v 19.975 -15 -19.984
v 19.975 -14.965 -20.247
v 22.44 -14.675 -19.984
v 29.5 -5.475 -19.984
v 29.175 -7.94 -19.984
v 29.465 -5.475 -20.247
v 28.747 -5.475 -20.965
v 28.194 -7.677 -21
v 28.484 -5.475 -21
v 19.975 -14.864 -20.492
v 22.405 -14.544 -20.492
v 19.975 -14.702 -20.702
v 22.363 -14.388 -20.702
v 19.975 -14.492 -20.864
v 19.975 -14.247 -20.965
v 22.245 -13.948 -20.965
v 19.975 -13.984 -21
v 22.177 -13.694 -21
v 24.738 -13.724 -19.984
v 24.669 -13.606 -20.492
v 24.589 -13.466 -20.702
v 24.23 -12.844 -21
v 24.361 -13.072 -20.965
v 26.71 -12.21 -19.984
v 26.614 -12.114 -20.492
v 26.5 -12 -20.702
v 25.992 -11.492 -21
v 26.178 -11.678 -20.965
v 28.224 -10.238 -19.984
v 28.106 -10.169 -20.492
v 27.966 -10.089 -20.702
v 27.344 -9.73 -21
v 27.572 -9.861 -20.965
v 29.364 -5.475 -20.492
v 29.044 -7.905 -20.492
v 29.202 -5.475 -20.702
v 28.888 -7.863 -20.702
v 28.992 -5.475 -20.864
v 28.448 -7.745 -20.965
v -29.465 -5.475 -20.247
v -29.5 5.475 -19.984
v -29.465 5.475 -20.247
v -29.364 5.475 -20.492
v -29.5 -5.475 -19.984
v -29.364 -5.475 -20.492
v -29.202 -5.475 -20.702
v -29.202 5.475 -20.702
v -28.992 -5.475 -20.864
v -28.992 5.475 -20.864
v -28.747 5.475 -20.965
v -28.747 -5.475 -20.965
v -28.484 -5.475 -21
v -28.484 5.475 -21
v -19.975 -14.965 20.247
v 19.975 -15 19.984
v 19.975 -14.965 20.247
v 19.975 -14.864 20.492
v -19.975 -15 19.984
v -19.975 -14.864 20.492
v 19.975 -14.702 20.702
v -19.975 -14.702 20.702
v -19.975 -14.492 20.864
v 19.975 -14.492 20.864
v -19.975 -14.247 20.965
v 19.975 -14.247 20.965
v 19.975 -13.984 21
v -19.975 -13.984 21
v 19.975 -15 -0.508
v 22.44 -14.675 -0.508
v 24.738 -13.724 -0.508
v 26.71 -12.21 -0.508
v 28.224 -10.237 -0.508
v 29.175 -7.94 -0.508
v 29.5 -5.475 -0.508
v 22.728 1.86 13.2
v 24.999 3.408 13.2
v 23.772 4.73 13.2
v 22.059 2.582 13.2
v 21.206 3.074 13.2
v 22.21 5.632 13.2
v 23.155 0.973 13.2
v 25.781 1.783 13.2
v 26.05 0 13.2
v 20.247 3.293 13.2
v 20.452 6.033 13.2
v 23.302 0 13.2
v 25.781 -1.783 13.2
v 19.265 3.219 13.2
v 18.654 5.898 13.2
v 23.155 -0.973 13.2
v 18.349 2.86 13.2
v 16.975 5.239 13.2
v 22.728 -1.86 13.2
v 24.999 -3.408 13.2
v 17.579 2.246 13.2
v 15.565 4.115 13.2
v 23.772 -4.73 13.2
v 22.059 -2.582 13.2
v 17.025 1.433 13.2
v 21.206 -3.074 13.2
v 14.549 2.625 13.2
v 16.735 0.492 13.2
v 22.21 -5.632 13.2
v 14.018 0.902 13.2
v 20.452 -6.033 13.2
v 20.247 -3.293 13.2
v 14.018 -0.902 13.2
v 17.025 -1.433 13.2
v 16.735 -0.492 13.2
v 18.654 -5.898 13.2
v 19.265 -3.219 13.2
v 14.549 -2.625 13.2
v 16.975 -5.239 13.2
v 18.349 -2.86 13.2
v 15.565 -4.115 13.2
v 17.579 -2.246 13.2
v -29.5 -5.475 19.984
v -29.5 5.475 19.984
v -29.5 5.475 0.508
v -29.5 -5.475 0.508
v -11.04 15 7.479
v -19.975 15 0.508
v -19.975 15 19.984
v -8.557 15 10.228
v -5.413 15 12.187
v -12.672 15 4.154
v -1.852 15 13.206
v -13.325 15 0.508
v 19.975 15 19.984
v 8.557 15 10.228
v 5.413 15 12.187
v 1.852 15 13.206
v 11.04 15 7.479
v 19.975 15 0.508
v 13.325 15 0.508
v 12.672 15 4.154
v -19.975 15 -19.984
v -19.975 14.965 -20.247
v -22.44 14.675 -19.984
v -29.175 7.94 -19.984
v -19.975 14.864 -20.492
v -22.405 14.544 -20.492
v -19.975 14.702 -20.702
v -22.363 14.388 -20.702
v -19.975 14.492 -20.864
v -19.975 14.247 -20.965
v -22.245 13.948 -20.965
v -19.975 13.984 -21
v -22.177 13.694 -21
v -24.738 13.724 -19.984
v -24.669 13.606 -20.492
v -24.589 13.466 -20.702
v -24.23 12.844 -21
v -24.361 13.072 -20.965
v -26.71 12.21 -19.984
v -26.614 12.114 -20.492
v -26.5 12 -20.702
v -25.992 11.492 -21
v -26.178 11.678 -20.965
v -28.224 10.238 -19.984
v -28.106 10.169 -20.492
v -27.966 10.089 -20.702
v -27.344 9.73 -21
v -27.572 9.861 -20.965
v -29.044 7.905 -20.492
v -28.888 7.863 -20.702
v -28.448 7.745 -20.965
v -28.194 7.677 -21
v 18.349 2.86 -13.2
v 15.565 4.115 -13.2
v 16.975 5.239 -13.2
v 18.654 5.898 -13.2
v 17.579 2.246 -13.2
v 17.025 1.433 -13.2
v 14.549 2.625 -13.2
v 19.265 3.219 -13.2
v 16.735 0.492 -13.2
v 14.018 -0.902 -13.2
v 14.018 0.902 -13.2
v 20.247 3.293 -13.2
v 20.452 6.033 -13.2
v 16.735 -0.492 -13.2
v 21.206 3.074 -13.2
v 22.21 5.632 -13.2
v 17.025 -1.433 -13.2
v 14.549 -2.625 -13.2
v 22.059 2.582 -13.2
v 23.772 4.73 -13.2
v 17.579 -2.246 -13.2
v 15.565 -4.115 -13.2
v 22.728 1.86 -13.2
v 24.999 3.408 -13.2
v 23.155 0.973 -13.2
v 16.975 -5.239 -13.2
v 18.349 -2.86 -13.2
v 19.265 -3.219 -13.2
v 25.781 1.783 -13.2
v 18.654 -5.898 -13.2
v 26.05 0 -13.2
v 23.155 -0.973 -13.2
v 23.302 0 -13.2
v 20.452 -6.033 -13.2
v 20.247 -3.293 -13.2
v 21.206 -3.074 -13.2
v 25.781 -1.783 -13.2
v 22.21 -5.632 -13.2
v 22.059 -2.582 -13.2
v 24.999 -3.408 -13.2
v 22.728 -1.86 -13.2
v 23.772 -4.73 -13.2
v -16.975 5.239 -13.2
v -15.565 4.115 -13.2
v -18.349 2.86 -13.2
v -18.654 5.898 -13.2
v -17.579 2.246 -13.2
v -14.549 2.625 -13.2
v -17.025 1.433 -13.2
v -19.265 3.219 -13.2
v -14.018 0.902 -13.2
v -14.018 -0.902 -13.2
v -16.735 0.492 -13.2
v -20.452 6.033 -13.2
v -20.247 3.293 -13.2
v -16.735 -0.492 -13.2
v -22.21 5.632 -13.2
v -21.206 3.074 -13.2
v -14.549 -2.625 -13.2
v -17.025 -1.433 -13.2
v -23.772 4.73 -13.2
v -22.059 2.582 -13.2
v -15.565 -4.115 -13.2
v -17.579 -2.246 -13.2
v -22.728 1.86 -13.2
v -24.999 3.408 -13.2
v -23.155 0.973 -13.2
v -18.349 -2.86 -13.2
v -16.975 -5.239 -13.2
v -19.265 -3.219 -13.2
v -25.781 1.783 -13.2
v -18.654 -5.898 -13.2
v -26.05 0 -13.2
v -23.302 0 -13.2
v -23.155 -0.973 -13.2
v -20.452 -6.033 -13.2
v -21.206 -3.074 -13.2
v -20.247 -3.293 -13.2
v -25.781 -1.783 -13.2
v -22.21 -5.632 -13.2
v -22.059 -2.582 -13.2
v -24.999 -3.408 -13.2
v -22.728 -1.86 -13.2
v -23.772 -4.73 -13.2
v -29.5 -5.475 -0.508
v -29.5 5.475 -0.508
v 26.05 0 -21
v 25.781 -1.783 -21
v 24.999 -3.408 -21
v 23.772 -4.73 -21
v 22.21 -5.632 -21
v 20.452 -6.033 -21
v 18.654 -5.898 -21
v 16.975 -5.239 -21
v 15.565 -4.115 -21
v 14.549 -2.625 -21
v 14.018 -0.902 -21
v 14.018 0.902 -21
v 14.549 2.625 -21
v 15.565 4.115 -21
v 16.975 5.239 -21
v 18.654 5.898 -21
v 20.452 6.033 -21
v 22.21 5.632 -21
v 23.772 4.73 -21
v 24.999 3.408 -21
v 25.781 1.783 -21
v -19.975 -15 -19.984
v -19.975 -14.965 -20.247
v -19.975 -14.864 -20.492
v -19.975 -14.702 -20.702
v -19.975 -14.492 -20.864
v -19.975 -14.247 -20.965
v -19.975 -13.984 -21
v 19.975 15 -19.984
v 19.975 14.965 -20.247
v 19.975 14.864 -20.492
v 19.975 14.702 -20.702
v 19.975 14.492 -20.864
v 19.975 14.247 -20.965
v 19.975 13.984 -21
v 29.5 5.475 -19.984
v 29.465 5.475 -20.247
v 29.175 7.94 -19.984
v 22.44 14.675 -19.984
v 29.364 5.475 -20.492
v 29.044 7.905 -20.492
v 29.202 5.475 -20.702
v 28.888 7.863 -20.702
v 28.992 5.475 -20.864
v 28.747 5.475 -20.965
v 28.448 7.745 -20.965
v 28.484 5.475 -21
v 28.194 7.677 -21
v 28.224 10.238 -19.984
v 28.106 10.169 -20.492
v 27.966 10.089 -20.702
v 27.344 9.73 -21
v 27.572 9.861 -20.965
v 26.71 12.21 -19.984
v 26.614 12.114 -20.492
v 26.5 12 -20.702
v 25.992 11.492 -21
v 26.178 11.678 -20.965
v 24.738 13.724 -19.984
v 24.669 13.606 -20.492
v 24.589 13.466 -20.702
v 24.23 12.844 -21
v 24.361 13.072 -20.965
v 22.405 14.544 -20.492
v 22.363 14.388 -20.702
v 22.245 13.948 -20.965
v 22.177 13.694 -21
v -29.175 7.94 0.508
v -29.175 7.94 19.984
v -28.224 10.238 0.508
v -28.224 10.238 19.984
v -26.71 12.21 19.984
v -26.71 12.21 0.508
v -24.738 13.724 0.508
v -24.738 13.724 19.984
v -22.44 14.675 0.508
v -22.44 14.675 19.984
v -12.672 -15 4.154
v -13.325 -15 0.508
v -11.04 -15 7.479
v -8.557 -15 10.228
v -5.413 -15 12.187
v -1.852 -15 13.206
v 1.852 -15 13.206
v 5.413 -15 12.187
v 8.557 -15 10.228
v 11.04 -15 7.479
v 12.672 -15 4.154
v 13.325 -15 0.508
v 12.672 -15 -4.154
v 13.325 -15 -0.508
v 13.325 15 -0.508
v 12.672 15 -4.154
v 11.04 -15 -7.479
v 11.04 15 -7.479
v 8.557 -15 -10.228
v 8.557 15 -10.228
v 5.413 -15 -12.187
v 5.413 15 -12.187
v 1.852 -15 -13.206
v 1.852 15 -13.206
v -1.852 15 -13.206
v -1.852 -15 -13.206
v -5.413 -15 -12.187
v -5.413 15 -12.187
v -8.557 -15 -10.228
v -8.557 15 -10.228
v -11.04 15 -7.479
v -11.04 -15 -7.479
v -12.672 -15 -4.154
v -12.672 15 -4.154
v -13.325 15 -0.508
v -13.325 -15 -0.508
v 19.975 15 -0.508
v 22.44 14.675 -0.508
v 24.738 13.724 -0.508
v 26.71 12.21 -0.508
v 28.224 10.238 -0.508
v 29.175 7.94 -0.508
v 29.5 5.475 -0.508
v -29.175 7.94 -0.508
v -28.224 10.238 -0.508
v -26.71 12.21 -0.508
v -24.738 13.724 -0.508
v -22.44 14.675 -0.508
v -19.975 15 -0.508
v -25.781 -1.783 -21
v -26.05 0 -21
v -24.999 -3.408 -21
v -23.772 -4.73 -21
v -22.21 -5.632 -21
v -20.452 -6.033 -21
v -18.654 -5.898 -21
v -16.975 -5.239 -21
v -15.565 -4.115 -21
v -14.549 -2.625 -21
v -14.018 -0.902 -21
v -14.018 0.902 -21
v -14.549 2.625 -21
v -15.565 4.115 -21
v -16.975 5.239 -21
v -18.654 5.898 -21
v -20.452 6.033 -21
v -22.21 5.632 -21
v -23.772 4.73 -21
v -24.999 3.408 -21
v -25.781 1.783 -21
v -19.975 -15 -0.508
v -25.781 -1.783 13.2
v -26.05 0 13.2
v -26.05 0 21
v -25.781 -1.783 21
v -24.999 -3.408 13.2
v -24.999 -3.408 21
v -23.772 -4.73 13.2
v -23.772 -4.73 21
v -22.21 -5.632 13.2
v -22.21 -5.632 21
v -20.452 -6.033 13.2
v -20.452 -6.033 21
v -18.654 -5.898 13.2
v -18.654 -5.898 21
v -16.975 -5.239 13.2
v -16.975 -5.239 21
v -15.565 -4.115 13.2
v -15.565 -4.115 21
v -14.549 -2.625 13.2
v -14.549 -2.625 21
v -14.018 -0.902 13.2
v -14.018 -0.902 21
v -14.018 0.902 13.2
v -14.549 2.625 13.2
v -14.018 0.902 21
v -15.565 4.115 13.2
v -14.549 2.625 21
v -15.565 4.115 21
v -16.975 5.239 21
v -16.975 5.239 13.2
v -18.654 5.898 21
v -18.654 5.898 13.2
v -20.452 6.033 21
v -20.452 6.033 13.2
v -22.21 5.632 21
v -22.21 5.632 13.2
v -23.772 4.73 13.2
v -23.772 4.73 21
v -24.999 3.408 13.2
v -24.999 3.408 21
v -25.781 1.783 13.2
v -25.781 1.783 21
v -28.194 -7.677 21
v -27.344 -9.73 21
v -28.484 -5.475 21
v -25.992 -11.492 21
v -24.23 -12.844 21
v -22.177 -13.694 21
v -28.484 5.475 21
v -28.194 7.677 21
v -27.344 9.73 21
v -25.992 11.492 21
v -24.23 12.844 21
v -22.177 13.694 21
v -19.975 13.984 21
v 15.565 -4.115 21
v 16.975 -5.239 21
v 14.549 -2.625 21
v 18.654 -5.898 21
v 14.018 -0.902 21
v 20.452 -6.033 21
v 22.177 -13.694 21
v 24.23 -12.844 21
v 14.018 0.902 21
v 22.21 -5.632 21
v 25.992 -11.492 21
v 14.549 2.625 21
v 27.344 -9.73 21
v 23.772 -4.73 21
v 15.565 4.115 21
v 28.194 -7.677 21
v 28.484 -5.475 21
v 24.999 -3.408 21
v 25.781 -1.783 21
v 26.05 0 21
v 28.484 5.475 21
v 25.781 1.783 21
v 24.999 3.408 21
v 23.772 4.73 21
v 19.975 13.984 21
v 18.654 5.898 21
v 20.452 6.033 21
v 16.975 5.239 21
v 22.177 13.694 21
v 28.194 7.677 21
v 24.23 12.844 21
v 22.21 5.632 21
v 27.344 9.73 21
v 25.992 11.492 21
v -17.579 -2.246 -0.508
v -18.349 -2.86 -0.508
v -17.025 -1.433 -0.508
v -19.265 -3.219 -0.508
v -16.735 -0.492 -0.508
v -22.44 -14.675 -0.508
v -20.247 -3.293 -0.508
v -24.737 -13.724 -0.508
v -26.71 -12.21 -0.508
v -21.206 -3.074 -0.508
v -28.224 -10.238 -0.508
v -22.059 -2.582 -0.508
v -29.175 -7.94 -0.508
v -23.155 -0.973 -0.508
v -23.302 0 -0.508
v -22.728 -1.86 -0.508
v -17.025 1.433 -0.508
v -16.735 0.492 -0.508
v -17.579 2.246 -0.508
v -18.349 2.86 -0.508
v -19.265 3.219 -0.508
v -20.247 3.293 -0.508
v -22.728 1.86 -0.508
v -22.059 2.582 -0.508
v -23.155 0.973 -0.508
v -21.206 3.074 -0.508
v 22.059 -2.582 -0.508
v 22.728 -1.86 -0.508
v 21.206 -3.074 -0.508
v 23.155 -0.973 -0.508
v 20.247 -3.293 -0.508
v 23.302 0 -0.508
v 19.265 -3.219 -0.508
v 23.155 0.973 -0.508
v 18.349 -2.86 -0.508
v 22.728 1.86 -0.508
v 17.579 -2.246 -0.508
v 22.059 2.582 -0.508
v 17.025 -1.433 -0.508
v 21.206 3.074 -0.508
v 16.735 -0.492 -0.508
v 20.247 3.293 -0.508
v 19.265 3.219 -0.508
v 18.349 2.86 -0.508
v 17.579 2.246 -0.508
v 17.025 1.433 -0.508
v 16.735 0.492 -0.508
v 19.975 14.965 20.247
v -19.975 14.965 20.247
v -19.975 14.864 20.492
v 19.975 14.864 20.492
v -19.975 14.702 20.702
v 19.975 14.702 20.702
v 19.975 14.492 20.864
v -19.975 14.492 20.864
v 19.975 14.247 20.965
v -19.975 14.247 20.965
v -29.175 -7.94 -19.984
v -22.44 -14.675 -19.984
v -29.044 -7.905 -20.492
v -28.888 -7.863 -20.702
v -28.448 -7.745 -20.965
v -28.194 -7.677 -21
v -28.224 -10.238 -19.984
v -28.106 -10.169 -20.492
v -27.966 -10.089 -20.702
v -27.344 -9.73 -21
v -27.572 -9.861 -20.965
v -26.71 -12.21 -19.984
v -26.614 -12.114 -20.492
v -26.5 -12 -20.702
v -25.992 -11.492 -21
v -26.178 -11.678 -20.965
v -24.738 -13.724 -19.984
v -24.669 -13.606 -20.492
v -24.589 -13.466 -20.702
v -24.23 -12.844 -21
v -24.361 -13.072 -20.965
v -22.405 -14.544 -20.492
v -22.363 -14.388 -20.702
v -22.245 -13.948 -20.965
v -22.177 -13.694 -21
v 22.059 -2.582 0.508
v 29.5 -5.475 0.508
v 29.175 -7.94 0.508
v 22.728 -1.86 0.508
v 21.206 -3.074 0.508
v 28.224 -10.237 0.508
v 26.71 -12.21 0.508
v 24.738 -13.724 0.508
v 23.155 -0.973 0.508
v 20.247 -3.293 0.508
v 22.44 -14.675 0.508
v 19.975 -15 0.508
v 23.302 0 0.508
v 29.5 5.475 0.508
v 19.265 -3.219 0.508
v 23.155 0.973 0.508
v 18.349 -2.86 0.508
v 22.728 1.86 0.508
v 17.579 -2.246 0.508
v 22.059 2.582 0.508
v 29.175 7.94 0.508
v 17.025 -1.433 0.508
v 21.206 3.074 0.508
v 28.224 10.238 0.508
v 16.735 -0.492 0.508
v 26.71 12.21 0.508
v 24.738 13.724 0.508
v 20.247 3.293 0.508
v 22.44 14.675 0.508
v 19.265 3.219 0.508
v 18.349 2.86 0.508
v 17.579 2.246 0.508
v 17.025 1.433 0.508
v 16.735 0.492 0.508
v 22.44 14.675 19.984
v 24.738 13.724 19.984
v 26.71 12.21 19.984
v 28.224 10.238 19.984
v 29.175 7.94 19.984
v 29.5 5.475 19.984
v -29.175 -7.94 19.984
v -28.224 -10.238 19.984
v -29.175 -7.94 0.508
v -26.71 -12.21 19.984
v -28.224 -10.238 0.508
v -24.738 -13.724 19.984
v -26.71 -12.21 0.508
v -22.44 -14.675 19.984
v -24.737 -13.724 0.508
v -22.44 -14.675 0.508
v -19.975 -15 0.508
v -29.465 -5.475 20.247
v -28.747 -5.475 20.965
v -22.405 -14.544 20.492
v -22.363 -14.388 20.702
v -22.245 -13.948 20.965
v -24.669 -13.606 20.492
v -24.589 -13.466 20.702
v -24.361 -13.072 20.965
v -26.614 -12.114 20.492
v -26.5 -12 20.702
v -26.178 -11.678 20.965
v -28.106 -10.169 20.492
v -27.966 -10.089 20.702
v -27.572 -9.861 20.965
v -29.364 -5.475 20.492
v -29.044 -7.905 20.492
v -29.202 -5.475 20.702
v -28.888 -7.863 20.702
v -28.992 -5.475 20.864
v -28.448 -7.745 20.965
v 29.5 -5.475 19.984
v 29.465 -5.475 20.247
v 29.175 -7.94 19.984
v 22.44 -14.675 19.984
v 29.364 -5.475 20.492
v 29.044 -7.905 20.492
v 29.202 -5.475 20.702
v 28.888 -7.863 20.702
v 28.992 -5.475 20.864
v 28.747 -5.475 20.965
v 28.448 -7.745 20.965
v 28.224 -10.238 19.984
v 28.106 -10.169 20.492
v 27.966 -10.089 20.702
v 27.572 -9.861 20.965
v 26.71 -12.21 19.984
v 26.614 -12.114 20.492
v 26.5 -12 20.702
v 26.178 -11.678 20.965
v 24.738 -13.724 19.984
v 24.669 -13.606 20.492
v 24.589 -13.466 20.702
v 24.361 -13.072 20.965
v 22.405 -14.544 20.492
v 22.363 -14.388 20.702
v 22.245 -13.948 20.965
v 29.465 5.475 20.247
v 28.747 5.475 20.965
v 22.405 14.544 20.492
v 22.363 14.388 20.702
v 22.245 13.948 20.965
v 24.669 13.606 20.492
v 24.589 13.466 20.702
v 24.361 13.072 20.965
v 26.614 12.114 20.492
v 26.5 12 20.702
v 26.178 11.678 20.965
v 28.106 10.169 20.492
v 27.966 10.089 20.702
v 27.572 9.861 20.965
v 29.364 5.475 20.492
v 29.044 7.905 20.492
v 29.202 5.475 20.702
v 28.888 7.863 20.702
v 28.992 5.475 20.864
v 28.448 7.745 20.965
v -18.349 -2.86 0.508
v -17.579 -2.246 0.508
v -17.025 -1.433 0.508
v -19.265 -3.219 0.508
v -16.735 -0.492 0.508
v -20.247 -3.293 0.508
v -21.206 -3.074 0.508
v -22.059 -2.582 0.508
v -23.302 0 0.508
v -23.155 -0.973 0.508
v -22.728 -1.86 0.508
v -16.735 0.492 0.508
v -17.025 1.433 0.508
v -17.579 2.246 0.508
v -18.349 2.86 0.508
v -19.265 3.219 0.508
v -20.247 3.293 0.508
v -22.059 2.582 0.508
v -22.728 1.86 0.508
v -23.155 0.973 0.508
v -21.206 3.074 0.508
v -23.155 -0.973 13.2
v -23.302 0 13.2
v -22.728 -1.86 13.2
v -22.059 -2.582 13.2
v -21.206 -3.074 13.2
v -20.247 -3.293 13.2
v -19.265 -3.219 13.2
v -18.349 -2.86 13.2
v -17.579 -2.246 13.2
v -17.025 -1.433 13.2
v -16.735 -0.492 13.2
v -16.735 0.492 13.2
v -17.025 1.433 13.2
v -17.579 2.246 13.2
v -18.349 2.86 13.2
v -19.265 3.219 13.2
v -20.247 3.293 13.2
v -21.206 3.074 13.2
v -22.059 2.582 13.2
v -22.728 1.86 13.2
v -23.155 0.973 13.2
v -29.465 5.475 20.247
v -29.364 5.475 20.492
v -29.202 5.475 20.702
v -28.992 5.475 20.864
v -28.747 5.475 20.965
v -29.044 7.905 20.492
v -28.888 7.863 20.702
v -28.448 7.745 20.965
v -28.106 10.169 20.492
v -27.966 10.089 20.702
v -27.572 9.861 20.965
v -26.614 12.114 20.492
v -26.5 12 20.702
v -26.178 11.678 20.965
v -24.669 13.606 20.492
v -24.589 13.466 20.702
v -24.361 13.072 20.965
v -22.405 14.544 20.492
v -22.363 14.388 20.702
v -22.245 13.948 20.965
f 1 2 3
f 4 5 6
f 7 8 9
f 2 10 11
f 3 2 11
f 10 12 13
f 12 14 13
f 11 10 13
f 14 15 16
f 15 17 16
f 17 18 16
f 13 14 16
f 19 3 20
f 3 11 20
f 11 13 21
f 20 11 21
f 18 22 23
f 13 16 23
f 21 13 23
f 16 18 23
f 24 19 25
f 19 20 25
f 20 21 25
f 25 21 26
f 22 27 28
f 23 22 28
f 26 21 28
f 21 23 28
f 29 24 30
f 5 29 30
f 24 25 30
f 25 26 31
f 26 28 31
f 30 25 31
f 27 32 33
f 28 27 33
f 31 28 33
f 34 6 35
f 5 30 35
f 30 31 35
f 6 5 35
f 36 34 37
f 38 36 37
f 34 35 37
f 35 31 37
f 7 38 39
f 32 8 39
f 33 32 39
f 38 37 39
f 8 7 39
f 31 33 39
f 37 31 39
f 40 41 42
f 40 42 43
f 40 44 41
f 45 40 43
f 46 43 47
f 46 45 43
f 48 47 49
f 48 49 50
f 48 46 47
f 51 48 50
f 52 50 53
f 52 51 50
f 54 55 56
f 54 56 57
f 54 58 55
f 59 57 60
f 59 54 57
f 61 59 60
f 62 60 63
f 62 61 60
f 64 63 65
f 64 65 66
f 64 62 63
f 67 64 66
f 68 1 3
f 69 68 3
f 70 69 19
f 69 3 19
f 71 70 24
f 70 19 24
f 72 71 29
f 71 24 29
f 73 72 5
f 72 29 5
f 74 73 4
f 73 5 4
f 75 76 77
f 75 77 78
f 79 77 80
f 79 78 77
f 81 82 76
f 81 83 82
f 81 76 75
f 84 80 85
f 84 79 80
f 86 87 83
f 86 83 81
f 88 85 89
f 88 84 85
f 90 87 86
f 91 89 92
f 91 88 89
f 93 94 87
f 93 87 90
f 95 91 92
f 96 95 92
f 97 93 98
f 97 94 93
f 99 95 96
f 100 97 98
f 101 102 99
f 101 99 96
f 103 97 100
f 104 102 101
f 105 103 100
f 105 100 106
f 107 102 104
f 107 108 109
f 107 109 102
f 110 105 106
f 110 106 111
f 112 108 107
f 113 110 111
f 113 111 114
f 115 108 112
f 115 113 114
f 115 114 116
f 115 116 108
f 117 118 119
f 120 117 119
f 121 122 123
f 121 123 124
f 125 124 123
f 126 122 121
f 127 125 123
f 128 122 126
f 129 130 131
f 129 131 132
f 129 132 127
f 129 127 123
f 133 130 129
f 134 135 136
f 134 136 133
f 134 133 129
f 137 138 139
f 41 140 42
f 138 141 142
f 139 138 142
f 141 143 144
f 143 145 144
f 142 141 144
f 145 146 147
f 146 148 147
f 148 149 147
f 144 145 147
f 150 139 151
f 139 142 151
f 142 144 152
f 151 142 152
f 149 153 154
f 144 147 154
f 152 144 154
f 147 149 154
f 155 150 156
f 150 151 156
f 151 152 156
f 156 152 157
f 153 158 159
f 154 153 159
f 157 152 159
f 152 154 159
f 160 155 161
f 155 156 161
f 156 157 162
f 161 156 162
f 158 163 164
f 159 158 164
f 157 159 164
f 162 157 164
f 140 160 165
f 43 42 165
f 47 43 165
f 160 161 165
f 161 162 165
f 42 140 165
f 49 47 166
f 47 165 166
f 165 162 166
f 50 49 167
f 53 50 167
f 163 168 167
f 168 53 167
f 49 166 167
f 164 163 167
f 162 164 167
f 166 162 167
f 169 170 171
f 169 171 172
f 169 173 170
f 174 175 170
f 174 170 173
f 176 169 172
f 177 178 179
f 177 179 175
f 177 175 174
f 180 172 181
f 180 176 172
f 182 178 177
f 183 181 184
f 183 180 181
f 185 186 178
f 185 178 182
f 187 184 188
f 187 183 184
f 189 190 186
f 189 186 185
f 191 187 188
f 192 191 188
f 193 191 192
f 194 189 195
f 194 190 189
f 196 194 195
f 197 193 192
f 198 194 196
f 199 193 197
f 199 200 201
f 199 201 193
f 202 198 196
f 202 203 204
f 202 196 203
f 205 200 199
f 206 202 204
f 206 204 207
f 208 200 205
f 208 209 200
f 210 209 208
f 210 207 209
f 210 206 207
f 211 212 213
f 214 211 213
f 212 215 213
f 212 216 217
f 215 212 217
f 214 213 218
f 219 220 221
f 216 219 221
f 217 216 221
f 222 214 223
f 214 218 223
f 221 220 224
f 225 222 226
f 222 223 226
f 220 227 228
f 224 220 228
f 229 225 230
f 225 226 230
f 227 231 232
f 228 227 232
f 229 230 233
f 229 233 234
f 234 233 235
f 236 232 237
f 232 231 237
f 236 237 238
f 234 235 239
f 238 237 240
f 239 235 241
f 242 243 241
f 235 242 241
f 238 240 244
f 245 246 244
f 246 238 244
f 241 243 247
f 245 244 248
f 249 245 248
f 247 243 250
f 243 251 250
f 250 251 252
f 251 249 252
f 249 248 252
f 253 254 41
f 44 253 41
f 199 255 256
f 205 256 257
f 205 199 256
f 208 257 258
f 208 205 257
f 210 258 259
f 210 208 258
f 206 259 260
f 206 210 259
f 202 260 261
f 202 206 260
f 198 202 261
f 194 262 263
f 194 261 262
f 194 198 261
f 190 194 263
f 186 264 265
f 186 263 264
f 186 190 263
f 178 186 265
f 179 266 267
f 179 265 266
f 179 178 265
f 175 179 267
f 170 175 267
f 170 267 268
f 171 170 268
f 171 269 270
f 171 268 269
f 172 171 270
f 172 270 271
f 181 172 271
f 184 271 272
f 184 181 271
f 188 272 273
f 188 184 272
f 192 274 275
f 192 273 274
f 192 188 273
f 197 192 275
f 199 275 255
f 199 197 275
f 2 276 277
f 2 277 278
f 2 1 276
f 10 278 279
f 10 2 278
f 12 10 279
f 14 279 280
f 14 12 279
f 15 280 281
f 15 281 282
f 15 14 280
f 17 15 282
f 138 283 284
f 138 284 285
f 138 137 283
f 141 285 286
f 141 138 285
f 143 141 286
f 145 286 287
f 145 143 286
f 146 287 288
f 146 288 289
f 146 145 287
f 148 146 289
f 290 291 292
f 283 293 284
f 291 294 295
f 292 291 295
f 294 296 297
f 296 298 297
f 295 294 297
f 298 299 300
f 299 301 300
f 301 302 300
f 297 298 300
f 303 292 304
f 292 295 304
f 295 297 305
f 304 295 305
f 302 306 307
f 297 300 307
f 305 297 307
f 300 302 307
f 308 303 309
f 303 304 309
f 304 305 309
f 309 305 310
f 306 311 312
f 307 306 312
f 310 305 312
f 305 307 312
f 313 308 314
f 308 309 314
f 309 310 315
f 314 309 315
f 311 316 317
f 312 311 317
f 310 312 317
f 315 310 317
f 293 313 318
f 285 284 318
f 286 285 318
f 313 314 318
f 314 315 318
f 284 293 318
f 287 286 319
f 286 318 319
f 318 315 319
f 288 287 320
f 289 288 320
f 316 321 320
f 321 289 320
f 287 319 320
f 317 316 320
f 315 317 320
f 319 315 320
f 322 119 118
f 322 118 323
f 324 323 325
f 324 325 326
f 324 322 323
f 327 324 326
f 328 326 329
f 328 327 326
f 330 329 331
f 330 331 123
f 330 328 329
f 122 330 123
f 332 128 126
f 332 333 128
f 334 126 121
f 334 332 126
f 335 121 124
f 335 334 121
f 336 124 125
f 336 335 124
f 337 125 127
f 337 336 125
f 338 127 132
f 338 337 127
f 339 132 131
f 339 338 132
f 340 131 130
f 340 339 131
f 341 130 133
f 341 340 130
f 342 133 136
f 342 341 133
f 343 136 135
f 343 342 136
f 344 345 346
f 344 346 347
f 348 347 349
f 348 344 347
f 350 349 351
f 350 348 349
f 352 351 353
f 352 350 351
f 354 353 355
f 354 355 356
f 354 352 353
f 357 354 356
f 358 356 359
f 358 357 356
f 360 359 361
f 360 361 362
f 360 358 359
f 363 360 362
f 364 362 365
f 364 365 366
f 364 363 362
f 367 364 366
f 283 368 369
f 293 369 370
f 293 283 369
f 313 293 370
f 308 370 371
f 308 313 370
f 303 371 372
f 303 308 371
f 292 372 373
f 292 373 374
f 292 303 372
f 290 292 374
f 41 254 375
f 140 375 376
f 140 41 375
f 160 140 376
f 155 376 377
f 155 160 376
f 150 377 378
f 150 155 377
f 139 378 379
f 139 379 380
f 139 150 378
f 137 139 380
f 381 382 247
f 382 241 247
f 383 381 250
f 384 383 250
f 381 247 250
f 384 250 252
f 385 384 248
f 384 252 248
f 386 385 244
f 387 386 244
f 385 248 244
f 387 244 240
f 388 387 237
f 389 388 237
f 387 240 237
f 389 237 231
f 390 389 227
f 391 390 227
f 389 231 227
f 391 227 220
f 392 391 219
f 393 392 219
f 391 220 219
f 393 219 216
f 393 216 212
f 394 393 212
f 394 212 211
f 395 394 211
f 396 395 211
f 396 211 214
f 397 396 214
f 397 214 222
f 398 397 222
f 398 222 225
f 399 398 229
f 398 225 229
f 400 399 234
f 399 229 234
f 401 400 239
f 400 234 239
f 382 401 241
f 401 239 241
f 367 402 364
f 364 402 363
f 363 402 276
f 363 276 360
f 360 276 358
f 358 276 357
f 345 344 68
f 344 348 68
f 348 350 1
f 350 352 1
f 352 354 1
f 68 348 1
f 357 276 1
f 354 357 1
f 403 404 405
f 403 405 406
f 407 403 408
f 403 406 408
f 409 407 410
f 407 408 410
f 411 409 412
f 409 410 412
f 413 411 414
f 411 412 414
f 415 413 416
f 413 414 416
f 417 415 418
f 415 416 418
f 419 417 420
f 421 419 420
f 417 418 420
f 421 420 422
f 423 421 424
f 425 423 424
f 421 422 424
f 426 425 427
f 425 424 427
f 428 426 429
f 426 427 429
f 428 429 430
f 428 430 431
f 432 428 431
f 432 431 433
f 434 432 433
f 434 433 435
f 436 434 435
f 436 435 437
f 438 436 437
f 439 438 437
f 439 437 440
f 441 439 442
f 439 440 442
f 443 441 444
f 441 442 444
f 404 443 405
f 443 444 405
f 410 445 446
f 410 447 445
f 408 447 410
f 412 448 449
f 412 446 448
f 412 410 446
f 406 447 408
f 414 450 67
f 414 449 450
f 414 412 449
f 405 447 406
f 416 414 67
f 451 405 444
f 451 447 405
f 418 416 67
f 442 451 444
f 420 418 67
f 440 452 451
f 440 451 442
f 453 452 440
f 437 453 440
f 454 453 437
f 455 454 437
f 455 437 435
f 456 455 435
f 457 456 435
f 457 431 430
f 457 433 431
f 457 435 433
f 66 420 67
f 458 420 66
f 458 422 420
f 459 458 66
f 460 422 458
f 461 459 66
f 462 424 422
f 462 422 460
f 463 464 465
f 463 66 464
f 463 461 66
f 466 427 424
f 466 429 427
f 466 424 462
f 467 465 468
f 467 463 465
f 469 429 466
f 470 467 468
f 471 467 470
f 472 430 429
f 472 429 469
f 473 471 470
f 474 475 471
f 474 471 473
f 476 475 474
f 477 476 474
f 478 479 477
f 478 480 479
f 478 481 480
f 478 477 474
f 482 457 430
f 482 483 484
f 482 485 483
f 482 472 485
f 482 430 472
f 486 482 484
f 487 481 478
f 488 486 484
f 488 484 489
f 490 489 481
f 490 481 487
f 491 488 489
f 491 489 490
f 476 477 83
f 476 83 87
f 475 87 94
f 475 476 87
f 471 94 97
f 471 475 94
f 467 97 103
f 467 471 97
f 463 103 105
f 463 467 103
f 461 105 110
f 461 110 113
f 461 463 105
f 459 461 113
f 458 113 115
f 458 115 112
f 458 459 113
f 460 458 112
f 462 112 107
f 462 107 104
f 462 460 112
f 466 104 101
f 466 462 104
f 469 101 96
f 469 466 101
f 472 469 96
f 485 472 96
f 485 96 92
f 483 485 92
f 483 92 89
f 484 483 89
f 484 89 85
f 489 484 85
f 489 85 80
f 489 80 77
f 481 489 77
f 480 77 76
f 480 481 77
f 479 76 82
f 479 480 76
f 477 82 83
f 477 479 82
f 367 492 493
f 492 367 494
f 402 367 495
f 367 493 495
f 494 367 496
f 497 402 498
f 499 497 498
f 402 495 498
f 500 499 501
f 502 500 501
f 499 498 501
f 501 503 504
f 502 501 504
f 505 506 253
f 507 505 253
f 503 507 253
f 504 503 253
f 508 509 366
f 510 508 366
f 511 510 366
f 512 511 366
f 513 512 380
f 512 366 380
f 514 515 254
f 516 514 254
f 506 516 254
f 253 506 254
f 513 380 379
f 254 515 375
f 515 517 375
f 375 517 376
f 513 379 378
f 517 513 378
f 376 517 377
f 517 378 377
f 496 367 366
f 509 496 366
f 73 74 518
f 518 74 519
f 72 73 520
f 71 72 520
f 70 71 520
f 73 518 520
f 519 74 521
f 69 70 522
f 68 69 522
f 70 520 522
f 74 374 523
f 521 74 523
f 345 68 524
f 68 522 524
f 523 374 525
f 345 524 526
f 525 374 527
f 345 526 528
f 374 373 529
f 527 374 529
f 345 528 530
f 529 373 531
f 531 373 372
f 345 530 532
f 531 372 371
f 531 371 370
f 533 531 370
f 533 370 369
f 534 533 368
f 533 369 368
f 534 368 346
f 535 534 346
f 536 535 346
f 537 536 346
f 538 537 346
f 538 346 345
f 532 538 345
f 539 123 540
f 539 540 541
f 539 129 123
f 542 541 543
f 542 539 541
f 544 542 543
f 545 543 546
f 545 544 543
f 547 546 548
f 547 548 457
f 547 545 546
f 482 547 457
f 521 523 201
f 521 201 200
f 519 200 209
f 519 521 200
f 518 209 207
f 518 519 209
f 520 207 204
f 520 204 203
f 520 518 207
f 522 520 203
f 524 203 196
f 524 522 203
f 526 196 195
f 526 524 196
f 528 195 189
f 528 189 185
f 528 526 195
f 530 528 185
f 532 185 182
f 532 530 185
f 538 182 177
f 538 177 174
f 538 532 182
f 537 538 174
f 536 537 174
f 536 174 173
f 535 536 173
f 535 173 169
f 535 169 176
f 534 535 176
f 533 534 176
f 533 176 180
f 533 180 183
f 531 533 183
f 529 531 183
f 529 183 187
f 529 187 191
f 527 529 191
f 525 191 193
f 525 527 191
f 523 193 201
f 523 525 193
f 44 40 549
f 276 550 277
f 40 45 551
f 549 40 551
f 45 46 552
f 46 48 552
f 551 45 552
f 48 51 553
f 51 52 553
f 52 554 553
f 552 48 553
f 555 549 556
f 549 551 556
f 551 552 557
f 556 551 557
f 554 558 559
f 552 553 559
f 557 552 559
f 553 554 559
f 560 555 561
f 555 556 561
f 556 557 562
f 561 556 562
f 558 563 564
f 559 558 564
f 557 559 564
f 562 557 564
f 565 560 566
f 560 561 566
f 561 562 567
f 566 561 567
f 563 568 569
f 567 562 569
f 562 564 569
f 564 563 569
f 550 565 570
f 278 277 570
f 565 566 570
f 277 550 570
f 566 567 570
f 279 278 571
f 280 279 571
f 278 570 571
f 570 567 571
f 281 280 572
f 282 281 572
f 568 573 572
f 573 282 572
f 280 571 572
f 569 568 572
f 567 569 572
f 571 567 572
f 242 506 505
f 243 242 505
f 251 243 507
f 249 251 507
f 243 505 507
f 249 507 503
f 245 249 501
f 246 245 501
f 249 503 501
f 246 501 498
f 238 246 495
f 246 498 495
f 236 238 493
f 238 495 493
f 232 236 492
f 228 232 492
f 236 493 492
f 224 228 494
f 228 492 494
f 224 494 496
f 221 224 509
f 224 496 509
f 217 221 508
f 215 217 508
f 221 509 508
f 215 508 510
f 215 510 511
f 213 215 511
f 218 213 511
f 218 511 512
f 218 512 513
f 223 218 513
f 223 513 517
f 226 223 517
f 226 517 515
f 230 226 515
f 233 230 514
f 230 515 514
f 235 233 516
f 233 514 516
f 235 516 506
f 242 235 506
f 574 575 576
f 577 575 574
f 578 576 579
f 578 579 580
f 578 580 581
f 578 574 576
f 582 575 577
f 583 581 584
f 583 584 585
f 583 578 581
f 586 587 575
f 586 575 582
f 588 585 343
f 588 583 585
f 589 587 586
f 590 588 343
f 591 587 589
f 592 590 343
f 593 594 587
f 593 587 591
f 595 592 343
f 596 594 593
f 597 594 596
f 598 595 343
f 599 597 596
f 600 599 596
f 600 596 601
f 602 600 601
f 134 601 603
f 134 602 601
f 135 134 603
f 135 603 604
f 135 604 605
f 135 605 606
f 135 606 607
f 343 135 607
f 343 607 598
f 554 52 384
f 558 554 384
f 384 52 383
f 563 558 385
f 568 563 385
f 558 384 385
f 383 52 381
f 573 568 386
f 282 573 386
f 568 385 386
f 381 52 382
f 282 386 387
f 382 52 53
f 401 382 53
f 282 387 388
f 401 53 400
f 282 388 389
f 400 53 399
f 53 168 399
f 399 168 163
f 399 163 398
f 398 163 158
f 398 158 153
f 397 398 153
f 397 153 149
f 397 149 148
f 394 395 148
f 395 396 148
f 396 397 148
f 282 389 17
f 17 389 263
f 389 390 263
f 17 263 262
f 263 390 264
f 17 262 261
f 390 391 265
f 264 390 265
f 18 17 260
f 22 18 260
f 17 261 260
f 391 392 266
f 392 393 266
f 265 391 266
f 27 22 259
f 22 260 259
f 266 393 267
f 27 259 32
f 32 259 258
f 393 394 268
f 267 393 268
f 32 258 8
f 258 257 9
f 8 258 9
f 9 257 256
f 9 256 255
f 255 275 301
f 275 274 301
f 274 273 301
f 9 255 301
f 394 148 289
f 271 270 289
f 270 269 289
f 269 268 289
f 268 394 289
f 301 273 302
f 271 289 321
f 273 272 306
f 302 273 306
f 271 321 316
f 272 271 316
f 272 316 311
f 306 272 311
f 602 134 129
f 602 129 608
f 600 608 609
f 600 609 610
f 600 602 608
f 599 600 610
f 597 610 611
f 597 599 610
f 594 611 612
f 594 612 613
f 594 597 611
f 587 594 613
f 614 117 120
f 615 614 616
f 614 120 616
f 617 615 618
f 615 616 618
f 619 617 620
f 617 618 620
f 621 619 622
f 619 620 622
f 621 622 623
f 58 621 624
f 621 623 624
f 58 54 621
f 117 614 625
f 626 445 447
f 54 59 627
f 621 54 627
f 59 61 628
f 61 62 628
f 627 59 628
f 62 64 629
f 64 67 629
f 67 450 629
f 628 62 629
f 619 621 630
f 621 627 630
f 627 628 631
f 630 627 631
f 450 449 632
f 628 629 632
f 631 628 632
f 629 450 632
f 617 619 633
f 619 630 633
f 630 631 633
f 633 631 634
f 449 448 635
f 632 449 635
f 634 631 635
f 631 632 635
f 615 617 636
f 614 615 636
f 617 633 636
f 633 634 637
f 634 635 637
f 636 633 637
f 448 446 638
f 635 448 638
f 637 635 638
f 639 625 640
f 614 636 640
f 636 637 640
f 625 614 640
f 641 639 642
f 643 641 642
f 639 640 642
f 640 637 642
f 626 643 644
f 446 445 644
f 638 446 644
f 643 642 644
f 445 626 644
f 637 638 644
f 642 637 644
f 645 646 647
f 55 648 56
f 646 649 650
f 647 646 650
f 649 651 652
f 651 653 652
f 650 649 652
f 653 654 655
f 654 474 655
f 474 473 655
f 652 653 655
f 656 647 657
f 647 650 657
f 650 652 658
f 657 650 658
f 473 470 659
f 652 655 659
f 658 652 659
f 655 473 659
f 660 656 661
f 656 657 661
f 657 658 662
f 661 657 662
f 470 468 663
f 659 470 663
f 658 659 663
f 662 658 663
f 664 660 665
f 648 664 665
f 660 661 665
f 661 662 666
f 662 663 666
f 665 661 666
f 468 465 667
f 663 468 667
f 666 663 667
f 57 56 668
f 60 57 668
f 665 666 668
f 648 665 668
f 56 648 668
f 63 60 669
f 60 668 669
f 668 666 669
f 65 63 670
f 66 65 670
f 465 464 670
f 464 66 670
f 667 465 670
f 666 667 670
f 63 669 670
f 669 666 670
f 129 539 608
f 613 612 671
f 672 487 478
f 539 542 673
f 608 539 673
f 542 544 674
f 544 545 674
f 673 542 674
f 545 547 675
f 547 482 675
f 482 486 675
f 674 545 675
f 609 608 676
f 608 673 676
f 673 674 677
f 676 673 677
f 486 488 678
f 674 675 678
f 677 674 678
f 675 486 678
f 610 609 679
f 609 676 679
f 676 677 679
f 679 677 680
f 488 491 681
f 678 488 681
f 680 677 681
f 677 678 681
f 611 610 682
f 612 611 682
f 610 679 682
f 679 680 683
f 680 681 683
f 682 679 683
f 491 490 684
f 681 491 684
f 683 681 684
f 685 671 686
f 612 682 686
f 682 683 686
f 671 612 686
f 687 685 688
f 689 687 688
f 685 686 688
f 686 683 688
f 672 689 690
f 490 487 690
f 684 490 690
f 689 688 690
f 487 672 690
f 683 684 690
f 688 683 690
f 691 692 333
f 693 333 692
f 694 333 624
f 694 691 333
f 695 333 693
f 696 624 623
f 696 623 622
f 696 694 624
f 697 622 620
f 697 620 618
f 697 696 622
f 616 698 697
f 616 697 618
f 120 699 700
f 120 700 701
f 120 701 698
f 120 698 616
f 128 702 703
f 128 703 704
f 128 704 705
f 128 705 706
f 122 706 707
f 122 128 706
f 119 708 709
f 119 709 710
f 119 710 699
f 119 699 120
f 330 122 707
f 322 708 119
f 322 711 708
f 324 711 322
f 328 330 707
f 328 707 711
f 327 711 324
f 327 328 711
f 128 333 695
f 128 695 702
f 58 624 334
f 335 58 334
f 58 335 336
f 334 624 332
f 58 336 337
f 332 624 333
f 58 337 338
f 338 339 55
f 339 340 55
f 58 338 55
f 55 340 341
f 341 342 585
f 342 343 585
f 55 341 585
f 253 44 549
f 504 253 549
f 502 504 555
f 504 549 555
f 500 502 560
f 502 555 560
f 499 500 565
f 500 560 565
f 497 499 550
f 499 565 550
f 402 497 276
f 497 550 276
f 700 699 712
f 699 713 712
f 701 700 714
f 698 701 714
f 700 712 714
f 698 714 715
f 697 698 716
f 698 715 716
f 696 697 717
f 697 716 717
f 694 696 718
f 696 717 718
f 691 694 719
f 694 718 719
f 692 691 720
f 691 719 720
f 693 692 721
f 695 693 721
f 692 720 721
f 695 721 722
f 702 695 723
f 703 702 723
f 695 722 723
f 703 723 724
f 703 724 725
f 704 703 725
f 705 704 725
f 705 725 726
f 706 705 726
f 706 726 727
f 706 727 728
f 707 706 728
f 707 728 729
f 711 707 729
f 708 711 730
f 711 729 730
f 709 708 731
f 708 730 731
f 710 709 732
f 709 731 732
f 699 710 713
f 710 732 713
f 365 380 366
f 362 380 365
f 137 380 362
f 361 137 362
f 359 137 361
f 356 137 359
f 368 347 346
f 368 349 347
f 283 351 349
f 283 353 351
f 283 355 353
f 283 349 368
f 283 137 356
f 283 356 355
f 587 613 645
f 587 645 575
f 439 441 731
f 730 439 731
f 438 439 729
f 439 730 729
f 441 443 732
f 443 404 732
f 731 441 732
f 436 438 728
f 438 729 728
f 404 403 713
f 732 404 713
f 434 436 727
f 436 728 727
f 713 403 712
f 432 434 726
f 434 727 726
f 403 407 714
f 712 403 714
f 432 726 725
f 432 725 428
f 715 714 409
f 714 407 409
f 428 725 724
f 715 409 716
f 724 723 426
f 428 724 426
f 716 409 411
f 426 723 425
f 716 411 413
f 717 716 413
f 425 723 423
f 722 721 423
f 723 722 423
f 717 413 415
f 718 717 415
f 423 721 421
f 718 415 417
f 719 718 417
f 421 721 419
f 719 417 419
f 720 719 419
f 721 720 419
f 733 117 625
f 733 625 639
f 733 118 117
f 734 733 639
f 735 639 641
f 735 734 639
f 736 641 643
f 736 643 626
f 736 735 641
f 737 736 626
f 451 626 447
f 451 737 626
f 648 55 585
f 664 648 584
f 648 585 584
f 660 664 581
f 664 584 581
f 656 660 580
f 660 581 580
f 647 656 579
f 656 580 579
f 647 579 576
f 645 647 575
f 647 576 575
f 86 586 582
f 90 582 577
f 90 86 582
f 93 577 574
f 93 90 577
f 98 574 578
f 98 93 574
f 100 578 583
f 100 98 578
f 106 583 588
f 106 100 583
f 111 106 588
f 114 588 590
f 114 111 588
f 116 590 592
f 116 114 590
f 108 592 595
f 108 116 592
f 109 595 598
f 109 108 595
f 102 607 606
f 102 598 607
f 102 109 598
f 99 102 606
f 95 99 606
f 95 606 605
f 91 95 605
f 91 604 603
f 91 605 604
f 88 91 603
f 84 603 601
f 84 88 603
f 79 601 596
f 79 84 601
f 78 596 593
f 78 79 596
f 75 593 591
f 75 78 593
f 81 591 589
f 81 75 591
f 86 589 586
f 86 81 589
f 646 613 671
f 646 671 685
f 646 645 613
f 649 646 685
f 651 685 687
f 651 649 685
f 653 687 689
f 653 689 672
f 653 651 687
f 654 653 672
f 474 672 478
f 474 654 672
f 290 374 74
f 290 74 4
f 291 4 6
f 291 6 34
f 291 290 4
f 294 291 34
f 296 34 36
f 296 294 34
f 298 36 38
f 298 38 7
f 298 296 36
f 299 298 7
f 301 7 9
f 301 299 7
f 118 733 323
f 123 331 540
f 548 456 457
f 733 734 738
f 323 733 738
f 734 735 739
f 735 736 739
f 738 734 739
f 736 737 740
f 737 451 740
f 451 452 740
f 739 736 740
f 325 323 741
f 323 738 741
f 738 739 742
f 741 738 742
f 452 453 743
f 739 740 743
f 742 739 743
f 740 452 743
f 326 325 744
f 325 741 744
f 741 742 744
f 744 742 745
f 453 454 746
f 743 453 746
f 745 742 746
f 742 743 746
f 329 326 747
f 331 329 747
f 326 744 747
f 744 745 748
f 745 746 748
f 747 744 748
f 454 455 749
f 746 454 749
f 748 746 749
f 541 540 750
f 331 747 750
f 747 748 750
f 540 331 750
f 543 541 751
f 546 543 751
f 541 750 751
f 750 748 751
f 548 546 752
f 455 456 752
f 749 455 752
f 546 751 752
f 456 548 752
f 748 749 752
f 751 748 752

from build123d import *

# Parameters (mm, degrees)
SKETCH1_W          = 59
SKETCH1_H          = 42
SKETCH1_R          = 13.335
EXTRUDE1_DEPTH     = 15
FILLET1_R          = 9.525
FILLET2_R          = 1.016
SKETCH4_W          = 72.5433568
SKETCH4_H          = 1.016
CUT_EXTRUDE3_DEPTH = 50.8


with BuildPart() as part:
    # Sketch1 → Extrude1 (new, symmetric)
    with BuildSketch(Plane(origin=(0, 0, 0), x_dir=(1, 0, 0), z_dir=(0, 1, 0))):
        Rectangle(SKETCH1_W, SKETCH1_H)
        with Locations(Location((0, 0, 0), (0, 0, 270))):
            Circle(SKETCH1_R, mode=Mode.SUBTRACT)
    extrude(amount=EXTRUDE1_DEPTH, both=True)

    # Sketch7 → Cut-Revolve1 (revolve, cut)
    with BuildSketch(Plane(origin=(20, 0, 0), x_dir=(0, 0, -1), z_dir=(1, 0, 0)), mode=Mode.PRIVATE) as cut_revolve1_sk:
        Polygon((-28.8, 0), (28.8, 0), (28.8, 6.05), (13.2, 6.05), (13.2, 3.302), (-13.2, 3.302), (-13.2, 6.05), (-28.8, 6.05), align=None)
    cut_revolve1 = revolve(cut_revolve1_sk.sketch.rotate(Axis((20, 0, -28.8), (0, 0, -1)), 90), axis=Axis((20, 0, -28.8), (0, 0, -1)), mode=Mode.SUBTRACT)

    # Mirror1: Cut-Revolve1 across plane
    add(cut_revolve1.mirror(Plane(origin=(0, 0, 0), x_dir=(0, 0, 1), z_dir=(1, 0, 0))), mode=Mode.SUBTRACT)

    # Fillet1
    fillet1_edges = [part.edges().sort_by_distance(p)[0] for p in [
        (29.5, 15, 0),
        (-29.5, 15, 0),
        (29.5, -15, 0),
        (-29.5, -15, 0),
    ]]
    fillet(fillet1_edges, radius=FILLET1_R)

    # Fillet2
    fillet2_edges = [part.edges().sort_by_distance(p)[0] for p in [
        (-29.5, 0, 21),
        (-29.5, 0, -21),
        (0, -15, 21),
        (29.5, 0, 21),
        (0, 15, 21),
        (26.710192091, 12.210192091, 21),
        (-26.710192091, 12.210192091, 21),
        (26.710192091, -12.210192091, 21),
        (-26.710192091, -12.210192091, 21),
        (0, -15, -21),
        (0, 15, -21),
        (29.5, 0, -21),
        (26.710192091, 12.210192091, -21),
        (-26.710192091, 12.210192091, -21),
        (26.710192091, -12.210192091, -21),
        (-26.710192091, -12.210192091, -21),
    ]]
    fillet(fillet2_edges, radius=FILLET2_R)

    # Sketch4 → Cut-Extrude3 (cut, symmetric)
    with BuildSketch(Plane(origin=(0, 0, 0), x_dir=(-1, 0, 0), z_dir=(0, 1, 0))):
        with Locations((2.534297891, 0)):
            Rectangle(SKETCH4_W, SKETCH4_H)
    extrude(amount=CUT_EXTRUDE3_DEPTH, both=True, mode=Mode.SUBTRACT)


with BuildPart() as cut_extrude3_piece_1:
    # of the separate pieces the step leaves, piece 1, a body of its own (cut_extrude3_pieces)
    add(part.part.solids().sort_by_distance((-28.484, 5.475, 21))[0])


with BuildPart() as cut_extrude3_piece_2:
    # of the separate pieces the step leaves, piece 2, a body of its own (cut_extrude3_pieces)
    add(part.part.solids().sort_by_distance((-29.5, 5.475, -19.984))[0])


solid = Compound([cut_extrude3_piece_1.part, cut_extrude3_piece_2.part])
